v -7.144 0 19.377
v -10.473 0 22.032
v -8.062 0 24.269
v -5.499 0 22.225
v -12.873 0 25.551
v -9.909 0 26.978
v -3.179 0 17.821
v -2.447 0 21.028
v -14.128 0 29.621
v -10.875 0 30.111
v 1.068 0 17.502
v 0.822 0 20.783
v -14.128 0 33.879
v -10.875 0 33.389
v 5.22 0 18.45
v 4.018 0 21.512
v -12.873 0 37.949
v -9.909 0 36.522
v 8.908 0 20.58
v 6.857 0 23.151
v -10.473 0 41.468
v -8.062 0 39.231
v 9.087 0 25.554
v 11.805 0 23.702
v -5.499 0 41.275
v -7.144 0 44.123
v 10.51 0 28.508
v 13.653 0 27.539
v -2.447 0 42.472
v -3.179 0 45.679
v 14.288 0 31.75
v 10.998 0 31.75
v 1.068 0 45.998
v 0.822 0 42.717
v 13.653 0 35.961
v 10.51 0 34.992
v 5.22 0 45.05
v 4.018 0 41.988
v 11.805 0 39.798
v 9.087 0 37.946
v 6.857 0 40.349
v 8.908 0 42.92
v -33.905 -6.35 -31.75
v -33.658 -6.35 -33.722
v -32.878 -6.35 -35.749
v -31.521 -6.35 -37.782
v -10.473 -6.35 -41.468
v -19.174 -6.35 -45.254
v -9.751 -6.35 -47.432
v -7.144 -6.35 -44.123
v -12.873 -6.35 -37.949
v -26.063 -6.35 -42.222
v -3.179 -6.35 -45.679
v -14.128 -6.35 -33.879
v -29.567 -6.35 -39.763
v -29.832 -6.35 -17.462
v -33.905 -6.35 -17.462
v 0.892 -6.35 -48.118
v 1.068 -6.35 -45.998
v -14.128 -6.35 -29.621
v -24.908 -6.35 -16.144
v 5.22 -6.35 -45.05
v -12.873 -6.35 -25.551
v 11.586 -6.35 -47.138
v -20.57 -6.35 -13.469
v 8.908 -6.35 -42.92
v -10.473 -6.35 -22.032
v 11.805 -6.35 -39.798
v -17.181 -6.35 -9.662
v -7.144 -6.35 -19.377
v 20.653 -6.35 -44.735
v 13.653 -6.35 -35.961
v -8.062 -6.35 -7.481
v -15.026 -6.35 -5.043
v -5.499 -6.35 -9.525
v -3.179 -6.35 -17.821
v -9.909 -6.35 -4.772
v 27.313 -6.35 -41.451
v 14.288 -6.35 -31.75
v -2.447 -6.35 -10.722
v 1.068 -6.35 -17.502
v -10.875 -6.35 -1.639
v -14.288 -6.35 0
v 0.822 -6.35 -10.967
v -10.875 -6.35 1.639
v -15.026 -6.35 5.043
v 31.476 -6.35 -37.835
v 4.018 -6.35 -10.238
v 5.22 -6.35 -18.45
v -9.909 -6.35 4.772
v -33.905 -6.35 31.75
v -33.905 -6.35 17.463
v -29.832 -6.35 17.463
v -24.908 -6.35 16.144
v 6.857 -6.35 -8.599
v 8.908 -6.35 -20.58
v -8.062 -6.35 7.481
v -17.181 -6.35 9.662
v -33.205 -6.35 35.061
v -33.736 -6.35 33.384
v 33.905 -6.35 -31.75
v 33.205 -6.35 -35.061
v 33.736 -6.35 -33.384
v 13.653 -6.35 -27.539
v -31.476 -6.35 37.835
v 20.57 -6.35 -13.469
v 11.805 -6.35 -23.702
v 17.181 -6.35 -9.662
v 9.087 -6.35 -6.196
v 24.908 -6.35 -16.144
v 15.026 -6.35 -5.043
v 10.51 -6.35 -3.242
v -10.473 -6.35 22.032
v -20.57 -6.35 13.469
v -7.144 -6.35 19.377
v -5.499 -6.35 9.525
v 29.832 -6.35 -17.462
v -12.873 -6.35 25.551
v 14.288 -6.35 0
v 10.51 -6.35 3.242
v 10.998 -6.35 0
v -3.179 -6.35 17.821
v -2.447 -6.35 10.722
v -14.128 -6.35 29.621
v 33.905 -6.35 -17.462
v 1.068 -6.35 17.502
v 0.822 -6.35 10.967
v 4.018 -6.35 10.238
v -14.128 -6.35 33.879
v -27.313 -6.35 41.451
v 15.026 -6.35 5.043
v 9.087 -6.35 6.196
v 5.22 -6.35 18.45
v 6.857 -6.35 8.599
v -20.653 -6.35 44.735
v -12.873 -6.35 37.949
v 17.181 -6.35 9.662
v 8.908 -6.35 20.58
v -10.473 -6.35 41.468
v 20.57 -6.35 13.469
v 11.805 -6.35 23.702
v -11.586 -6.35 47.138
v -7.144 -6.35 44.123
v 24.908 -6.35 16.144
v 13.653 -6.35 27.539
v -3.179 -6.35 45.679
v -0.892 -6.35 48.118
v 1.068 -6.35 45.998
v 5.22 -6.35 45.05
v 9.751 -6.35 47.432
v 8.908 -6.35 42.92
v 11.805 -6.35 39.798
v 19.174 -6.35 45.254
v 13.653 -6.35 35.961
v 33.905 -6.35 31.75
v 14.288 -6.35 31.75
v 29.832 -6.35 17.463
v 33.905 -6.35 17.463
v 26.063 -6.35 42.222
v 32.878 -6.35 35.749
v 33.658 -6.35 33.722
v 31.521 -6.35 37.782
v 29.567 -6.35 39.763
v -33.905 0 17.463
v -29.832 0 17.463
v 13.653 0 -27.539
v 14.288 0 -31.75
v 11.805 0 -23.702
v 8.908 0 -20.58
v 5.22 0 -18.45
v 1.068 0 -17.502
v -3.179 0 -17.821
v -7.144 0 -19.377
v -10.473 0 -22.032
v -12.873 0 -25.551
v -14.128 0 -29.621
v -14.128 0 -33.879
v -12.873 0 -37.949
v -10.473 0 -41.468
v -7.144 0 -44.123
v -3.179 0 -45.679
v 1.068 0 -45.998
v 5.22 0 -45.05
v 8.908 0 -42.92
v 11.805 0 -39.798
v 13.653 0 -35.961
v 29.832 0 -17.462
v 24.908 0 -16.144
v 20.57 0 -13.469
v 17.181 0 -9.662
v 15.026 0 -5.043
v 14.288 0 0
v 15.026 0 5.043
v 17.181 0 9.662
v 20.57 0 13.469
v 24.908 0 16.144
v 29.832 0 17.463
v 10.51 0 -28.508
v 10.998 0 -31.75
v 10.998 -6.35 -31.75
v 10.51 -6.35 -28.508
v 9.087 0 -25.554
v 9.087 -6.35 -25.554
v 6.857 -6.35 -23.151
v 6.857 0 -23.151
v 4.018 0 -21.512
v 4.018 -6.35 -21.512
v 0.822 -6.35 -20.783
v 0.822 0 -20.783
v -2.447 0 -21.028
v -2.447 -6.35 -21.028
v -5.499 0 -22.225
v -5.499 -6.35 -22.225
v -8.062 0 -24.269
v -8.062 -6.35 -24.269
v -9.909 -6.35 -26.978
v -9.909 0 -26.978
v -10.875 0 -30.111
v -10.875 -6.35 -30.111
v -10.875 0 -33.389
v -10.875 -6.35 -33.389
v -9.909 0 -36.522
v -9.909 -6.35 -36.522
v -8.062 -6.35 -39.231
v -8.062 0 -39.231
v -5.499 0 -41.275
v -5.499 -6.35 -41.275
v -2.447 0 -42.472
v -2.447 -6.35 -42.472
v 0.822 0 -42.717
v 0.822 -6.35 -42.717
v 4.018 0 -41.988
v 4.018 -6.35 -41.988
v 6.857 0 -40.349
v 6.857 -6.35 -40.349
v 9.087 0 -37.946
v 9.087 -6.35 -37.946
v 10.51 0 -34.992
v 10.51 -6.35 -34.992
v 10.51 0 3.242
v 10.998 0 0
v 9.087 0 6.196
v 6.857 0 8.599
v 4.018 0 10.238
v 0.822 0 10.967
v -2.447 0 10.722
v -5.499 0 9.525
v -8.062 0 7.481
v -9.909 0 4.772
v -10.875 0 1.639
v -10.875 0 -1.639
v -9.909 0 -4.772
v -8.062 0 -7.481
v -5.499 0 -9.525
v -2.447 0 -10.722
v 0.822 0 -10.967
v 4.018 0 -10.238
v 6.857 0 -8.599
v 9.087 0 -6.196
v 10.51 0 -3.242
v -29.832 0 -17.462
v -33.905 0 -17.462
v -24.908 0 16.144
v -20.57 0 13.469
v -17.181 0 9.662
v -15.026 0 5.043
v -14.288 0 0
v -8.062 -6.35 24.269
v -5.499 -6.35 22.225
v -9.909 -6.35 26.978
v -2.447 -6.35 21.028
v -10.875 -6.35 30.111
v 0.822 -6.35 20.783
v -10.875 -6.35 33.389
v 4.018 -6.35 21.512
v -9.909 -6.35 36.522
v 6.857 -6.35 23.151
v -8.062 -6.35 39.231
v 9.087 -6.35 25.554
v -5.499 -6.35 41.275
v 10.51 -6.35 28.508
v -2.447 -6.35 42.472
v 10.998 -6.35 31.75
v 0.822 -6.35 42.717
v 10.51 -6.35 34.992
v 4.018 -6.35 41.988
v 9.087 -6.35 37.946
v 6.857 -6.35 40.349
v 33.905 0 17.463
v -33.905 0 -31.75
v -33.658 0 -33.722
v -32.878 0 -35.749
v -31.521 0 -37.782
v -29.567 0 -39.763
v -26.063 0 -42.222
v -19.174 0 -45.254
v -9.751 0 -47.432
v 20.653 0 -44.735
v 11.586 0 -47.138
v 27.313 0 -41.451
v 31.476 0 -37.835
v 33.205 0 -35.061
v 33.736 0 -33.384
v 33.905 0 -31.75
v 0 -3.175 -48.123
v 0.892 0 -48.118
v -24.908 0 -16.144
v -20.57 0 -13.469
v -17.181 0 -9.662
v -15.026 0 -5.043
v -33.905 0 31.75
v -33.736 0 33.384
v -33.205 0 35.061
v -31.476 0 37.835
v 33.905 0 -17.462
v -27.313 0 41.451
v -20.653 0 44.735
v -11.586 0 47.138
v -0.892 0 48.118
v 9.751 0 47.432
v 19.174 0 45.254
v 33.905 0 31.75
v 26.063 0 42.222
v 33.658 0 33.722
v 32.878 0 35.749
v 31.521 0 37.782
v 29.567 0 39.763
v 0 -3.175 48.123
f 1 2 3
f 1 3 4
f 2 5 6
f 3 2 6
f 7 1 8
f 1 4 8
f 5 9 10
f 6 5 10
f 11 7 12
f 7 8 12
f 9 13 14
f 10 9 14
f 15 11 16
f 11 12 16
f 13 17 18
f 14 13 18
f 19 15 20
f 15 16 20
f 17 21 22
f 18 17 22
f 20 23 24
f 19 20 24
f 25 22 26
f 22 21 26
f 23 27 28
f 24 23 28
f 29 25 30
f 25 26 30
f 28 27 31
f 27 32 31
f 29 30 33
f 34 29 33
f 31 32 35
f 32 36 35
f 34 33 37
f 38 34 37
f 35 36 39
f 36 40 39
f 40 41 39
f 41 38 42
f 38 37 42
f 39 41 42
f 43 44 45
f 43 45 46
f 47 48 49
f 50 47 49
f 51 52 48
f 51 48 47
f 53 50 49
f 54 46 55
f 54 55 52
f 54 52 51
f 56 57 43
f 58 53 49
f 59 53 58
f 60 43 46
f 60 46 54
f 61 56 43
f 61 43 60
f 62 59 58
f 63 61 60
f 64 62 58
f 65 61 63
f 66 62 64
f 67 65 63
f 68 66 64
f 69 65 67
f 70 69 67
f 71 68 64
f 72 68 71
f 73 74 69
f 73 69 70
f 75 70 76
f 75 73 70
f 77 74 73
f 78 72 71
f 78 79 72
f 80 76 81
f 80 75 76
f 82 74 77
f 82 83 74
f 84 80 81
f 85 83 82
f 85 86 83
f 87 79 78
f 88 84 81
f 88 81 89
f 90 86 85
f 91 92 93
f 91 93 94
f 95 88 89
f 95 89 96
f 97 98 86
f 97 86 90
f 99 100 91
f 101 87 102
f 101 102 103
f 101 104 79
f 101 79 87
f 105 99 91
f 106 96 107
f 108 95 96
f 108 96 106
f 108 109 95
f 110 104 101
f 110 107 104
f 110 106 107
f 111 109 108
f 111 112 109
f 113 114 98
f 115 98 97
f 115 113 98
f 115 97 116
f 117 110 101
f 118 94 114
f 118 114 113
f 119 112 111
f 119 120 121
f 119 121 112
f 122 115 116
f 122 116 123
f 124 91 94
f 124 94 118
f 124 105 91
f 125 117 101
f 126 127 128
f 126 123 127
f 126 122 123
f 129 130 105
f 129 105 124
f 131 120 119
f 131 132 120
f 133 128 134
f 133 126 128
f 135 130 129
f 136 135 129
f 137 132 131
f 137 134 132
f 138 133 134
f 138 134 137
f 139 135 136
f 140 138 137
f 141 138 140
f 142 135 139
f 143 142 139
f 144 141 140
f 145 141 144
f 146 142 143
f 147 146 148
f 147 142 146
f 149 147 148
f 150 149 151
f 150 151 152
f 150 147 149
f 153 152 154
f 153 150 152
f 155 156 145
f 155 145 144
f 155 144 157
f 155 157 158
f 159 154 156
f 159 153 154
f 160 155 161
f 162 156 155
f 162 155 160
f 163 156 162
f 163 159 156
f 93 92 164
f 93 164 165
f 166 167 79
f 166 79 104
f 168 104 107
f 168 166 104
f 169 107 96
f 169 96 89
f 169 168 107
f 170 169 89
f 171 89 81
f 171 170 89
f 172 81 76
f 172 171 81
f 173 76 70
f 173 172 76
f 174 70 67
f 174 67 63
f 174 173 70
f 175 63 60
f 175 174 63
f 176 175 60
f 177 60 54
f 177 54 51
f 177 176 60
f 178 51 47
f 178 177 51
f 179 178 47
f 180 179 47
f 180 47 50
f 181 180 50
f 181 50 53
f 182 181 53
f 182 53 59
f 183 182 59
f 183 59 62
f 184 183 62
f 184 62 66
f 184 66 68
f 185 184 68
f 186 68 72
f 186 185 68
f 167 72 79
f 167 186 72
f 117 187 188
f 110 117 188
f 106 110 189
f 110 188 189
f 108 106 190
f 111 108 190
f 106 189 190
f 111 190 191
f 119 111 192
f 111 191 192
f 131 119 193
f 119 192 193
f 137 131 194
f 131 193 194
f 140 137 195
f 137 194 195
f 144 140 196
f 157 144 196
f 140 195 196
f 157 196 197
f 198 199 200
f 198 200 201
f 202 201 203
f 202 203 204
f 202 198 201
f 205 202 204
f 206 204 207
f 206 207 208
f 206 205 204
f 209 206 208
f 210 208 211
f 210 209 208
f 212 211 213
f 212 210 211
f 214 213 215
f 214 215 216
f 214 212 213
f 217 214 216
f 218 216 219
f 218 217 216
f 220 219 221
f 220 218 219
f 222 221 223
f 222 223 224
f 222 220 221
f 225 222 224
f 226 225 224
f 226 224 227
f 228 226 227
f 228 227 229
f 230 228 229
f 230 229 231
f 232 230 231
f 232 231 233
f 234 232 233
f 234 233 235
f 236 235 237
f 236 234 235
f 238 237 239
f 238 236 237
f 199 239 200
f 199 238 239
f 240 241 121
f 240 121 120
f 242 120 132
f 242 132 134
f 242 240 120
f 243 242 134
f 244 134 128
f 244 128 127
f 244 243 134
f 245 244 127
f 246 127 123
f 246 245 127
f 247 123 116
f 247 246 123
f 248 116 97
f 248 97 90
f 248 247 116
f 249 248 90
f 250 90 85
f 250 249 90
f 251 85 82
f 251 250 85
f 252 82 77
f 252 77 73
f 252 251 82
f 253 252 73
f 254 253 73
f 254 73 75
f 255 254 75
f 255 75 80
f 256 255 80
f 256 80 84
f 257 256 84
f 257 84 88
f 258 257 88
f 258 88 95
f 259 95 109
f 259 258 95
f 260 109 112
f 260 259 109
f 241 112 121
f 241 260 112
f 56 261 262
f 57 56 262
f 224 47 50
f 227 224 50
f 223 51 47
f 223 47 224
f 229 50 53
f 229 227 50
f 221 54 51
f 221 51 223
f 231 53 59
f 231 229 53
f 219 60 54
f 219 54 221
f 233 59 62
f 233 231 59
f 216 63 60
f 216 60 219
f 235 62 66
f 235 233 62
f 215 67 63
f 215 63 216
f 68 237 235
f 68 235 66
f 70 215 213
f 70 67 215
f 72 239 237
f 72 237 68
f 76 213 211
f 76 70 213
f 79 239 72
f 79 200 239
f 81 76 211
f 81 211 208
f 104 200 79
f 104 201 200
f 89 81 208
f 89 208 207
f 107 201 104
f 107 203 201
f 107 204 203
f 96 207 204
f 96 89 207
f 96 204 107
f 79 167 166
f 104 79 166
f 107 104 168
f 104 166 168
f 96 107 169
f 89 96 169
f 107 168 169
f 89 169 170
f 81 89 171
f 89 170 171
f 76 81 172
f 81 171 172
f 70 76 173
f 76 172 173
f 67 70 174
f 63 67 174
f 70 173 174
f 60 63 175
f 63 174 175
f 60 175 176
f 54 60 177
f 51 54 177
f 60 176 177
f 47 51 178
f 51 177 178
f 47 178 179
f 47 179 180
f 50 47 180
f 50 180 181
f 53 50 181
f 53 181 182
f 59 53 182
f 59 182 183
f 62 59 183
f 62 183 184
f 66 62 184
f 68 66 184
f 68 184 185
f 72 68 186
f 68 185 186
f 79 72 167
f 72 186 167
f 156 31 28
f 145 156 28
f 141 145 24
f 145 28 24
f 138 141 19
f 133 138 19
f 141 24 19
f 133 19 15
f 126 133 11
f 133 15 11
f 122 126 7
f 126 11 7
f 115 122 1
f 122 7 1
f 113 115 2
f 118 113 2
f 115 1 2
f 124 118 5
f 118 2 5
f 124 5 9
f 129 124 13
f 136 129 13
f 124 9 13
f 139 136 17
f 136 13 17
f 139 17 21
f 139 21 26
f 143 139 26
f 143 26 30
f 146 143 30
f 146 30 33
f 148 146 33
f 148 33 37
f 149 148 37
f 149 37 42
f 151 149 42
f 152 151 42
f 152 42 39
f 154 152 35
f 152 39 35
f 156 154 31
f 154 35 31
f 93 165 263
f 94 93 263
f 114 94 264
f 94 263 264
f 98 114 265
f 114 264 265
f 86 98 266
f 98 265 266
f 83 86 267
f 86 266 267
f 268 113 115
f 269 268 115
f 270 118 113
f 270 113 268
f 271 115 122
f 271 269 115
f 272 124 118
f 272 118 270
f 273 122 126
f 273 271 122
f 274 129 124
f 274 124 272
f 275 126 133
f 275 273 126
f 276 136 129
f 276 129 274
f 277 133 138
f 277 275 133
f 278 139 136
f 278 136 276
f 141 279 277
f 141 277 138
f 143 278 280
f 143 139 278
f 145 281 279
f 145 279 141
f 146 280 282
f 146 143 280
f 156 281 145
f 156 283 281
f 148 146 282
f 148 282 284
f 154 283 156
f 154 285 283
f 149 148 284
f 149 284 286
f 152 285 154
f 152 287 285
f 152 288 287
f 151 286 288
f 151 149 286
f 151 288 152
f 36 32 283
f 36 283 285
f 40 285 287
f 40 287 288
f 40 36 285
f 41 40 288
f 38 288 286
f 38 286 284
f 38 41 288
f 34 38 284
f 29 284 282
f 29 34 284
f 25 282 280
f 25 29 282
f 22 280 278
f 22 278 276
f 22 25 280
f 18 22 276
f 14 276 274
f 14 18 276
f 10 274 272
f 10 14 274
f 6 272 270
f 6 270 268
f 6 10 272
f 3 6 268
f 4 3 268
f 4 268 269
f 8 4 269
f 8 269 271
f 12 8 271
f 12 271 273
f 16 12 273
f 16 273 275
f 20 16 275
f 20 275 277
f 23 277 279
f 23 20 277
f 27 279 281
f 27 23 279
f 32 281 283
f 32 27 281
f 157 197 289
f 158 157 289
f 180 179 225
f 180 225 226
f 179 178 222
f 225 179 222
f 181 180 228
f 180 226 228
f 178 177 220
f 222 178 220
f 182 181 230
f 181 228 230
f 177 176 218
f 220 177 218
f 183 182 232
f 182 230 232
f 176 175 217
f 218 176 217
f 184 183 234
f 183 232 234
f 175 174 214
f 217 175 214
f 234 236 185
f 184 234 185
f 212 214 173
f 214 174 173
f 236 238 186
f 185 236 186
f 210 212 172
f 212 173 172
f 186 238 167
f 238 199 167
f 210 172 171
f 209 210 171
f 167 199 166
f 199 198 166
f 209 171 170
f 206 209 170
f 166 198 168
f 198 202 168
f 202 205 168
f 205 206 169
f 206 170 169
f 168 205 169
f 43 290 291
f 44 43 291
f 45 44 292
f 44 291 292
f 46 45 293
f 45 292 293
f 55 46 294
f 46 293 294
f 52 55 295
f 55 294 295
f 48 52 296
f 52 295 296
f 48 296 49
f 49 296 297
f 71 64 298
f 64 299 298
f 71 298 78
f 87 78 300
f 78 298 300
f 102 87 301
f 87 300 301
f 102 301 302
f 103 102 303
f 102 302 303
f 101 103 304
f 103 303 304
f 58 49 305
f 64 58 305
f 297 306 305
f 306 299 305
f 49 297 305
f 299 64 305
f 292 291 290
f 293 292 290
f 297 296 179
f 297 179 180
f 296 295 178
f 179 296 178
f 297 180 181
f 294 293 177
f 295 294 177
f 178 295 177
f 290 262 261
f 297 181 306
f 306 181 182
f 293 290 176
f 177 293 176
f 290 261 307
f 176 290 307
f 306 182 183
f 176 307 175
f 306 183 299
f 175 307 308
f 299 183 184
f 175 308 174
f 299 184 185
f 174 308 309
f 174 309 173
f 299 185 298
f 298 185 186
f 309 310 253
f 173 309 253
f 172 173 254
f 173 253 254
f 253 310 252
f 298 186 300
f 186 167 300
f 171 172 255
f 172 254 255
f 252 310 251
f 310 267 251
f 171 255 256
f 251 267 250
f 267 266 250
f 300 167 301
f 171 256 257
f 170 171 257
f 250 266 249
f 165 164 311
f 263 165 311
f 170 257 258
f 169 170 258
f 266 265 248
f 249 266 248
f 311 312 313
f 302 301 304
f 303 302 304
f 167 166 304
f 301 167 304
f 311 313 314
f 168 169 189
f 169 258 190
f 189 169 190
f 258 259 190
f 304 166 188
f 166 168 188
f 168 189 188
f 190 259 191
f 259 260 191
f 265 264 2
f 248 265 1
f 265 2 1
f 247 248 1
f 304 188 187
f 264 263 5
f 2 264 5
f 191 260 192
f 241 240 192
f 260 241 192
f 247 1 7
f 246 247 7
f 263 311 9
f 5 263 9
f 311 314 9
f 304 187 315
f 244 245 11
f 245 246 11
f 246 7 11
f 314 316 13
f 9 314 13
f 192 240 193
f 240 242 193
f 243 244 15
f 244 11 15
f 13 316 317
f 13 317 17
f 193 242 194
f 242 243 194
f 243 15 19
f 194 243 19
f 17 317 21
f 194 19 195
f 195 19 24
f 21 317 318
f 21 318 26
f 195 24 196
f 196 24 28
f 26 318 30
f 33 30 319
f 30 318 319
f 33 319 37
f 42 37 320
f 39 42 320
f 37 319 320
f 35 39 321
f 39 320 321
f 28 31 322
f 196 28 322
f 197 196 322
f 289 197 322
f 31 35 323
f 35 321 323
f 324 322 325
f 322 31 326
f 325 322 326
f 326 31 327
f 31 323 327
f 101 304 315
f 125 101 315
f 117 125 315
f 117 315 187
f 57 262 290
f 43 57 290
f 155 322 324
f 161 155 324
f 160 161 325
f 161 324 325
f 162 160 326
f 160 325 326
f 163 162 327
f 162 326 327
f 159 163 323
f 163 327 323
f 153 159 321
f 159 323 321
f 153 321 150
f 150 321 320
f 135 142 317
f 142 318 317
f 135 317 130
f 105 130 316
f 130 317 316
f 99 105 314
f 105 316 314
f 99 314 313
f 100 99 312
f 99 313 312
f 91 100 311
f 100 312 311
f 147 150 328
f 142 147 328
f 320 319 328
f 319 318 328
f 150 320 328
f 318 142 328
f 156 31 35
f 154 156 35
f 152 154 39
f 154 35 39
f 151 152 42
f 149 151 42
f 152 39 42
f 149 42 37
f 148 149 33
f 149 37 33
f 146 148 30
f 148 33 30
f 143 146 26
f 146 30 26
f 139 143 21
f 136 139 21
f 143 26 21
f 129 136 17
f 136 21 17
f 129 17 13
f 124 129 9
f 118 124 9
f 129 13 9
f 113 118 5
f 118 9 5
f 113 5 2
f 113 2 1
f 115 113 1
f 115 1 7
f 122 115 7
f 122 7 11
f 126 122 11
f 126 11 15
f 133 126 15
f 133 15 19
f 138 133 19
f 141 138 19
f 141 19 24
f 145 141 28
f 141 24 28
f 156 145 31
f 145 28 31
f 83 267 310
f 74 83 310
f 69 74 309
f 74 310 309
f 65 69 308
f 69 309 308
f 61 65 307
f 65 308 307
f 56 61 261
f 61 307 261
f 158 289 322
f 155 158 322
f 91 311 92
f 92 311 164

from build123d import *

# Parameters (mm, degrees)
F1_R     = 10.9982
F1_R_2   = 14.2875
F2_DEPTH = 6.35
F0_R     = 14.2875
F0_R_2   = 10.9982


with BuildPart() as f2:
    # F1 (on Front) → F2 (new body)
    with BuildSketch(Plane.XZ):
        with BuildLine():
            Line((-33.9049473405, 17.4625), (-29.8317704118, 17.4625))
            ThreePointArc((-29.8317704118, 17.4625), (-31.8683588761, 17.5808588761), (-33.9049473405, 17.4625))
        make_face()
        with BuildLine():
            ThreePointArc((-33.9049473405, -17.4625), (-31.8683588761, -17.5808588761), (-29.8317704118, -17.4625))
            Line((-29.8317704118, -17.4625), (-33.9049473405, -17.4625))
        make_face()
        with BuildLine():
            ThreePointArc((33.9049473405, 17.4625), (31.8683588761, 17.5808588761), (29.8317704118, 17.4625))
            Line((29.8317704118, 17.4625), (33.9049473405, 17.4625))
        make_face()
        with BuildLine():
            Line((33.9049473405, -17.4625), (29.8317704118, -17.4625))
            ThreePointArc((29.8317704118, -17.4625), (31.8683588761, -17.5808588761), (33.9049473405, -17.4625))
        make_face()
        with BuildLine():
            ThreePointArc((-14.2875, 1.47e-08), (-7.3e-09, -14.2875), (14.2875, 0))
            ThreePointArc((14.2875, 0), (7.3e-09, 14.2875), (-14.2875, 1.47e-08))
        make_face()
        Circle(F1_R, mode=Mode.SUBTRACT)
        with BuildLine():
            ThreePointArc((29.8317704118, -17.4625), (18.7364973706, -11.689346099), (14.2875, 0))
            ThreePointArc((14.2875, 0), (-7.3e-09, -14.2875), (-14.2875, 1.47e-08))
            ThreePointArc((-14.2875, 1.47e-08), (-18.7364973657, -11.6893460935), (-29.8317704118, -17.4625))
            ThreePointArc((-29.8317704118, -17.4625), (-31.8683588761, -17.5808588761), (-33.9049473405, -17.4625))
            Line((-33.9049473405, -17.4625), (-33.9049473405, -31.75))
            add(Edge.make_bspline(
                [(-33.9049473405, -31.75), (-33.9049473405, -48.1233965864), (0, -48.1233965864), (33.9049473405, -48.1233965864), (33.9049473405, -31.75)],
                knots=[3.1415926536, 3.1415926536, 3.1415926536, 4.7123889804, 4.7123889804, 6.2831853072, 6.2831853072, 6.2831853072], degree=2, weights=[1, 0.7071067812, 1, 0.7071067812, 1]))
            Line((33.9049473405, -31.75), (33.9049473405, -17.4625))
            ThreePointArc((33.9049473405, -17.4625), (31.8683588761, -17.5808588761), (29.8317704118, -17.4625))
        make_face()
        with Locations((0, -31.75)):
            Circle(F1_R_2, mode=Mode.SUBTRACT)
        with BuildLine():
            ThreePointArc((-14.2875, 1.47e-08), (7.3e-09, 14.2875), (14.2875, 0))
            ThreePointArc((14.2875, 0), (18.7364973706, 11.689346099), (29.8317704118, 17.4625))
            ThreePointArc((29.8317704118, 17.4625), (31.8683588761, 17.5808588761), (33.9049473405, 17.4625))
            Line((33.9049473405, 17.4625), (33.9049473405, 31.75))
            add(Edge.make_bspline(
                [(33.9049473405, 31.75), (33.9049473405, 48.1233965864), (0, 48.1233965864), (-33.9049473405, 48.1233965864), (-33.9049473405, 31.75)],
                knots=[3.1415926536, 3.1415926536, 3.1415926536, 4.7123889804, 4.7123889804, 6.2831853072, 6.2831853072, 6.2831853072], degree=2, weights=[1, 0.7071067812, 1, 0.7071067812, 1]))
            Line((-33.9049473405, 31.75), (-33.9049473405, 17.4625))
            ThreePointArc((-33.9049473405, 17.4625), (-31.8683588761, 17.5808588761), (-29.8317704118, 17.4625))
            ThreePointArc((-29.8317704118, 17.4625), (-18.7364973754, 11.6893461044), (-14.2875, 1.47e-08))
        make_face()
        with BuildLine():
            ThreePointArc((-14.2875, 31.75), (0, 46.0375), (14.2875, 31.75))
            ThreePointArc((14.2875, 31.75), (0, 17.4625), (-14.2875, 31.75))
        make_face(mode=Mode.SUBTRACT)
    extrude(amount=F2_DEPTH)


with BuildPart() as f2b:
    # F0 (on Front) → F2, piece 2 (new body)
    with BuildSketch(Plane.XZ):
        with Locations((0, 31.75)):
            Circle(F0_R)
        with Locations((0, 31.75)):
            Circle(F0_R_2, mode=Mode.SUBTRACT)
    extrude(amount=F2_DEPTH)


with BuildPart() as f2c:
    # F0 (on Front) → F2, piece 3 (new body)
    with BuildSketch(Plane.XZ):
        with Locations((0, -31.75)):
            Circle(F0_R)
        with Locations((0, -31.75)):
            Circle(F0_R_2, mode=Mode.SUBTRACT)
    extrude(amount=F2_DEPTH)


solid = Compound([f2.part, f2b.part, f2c.part])
